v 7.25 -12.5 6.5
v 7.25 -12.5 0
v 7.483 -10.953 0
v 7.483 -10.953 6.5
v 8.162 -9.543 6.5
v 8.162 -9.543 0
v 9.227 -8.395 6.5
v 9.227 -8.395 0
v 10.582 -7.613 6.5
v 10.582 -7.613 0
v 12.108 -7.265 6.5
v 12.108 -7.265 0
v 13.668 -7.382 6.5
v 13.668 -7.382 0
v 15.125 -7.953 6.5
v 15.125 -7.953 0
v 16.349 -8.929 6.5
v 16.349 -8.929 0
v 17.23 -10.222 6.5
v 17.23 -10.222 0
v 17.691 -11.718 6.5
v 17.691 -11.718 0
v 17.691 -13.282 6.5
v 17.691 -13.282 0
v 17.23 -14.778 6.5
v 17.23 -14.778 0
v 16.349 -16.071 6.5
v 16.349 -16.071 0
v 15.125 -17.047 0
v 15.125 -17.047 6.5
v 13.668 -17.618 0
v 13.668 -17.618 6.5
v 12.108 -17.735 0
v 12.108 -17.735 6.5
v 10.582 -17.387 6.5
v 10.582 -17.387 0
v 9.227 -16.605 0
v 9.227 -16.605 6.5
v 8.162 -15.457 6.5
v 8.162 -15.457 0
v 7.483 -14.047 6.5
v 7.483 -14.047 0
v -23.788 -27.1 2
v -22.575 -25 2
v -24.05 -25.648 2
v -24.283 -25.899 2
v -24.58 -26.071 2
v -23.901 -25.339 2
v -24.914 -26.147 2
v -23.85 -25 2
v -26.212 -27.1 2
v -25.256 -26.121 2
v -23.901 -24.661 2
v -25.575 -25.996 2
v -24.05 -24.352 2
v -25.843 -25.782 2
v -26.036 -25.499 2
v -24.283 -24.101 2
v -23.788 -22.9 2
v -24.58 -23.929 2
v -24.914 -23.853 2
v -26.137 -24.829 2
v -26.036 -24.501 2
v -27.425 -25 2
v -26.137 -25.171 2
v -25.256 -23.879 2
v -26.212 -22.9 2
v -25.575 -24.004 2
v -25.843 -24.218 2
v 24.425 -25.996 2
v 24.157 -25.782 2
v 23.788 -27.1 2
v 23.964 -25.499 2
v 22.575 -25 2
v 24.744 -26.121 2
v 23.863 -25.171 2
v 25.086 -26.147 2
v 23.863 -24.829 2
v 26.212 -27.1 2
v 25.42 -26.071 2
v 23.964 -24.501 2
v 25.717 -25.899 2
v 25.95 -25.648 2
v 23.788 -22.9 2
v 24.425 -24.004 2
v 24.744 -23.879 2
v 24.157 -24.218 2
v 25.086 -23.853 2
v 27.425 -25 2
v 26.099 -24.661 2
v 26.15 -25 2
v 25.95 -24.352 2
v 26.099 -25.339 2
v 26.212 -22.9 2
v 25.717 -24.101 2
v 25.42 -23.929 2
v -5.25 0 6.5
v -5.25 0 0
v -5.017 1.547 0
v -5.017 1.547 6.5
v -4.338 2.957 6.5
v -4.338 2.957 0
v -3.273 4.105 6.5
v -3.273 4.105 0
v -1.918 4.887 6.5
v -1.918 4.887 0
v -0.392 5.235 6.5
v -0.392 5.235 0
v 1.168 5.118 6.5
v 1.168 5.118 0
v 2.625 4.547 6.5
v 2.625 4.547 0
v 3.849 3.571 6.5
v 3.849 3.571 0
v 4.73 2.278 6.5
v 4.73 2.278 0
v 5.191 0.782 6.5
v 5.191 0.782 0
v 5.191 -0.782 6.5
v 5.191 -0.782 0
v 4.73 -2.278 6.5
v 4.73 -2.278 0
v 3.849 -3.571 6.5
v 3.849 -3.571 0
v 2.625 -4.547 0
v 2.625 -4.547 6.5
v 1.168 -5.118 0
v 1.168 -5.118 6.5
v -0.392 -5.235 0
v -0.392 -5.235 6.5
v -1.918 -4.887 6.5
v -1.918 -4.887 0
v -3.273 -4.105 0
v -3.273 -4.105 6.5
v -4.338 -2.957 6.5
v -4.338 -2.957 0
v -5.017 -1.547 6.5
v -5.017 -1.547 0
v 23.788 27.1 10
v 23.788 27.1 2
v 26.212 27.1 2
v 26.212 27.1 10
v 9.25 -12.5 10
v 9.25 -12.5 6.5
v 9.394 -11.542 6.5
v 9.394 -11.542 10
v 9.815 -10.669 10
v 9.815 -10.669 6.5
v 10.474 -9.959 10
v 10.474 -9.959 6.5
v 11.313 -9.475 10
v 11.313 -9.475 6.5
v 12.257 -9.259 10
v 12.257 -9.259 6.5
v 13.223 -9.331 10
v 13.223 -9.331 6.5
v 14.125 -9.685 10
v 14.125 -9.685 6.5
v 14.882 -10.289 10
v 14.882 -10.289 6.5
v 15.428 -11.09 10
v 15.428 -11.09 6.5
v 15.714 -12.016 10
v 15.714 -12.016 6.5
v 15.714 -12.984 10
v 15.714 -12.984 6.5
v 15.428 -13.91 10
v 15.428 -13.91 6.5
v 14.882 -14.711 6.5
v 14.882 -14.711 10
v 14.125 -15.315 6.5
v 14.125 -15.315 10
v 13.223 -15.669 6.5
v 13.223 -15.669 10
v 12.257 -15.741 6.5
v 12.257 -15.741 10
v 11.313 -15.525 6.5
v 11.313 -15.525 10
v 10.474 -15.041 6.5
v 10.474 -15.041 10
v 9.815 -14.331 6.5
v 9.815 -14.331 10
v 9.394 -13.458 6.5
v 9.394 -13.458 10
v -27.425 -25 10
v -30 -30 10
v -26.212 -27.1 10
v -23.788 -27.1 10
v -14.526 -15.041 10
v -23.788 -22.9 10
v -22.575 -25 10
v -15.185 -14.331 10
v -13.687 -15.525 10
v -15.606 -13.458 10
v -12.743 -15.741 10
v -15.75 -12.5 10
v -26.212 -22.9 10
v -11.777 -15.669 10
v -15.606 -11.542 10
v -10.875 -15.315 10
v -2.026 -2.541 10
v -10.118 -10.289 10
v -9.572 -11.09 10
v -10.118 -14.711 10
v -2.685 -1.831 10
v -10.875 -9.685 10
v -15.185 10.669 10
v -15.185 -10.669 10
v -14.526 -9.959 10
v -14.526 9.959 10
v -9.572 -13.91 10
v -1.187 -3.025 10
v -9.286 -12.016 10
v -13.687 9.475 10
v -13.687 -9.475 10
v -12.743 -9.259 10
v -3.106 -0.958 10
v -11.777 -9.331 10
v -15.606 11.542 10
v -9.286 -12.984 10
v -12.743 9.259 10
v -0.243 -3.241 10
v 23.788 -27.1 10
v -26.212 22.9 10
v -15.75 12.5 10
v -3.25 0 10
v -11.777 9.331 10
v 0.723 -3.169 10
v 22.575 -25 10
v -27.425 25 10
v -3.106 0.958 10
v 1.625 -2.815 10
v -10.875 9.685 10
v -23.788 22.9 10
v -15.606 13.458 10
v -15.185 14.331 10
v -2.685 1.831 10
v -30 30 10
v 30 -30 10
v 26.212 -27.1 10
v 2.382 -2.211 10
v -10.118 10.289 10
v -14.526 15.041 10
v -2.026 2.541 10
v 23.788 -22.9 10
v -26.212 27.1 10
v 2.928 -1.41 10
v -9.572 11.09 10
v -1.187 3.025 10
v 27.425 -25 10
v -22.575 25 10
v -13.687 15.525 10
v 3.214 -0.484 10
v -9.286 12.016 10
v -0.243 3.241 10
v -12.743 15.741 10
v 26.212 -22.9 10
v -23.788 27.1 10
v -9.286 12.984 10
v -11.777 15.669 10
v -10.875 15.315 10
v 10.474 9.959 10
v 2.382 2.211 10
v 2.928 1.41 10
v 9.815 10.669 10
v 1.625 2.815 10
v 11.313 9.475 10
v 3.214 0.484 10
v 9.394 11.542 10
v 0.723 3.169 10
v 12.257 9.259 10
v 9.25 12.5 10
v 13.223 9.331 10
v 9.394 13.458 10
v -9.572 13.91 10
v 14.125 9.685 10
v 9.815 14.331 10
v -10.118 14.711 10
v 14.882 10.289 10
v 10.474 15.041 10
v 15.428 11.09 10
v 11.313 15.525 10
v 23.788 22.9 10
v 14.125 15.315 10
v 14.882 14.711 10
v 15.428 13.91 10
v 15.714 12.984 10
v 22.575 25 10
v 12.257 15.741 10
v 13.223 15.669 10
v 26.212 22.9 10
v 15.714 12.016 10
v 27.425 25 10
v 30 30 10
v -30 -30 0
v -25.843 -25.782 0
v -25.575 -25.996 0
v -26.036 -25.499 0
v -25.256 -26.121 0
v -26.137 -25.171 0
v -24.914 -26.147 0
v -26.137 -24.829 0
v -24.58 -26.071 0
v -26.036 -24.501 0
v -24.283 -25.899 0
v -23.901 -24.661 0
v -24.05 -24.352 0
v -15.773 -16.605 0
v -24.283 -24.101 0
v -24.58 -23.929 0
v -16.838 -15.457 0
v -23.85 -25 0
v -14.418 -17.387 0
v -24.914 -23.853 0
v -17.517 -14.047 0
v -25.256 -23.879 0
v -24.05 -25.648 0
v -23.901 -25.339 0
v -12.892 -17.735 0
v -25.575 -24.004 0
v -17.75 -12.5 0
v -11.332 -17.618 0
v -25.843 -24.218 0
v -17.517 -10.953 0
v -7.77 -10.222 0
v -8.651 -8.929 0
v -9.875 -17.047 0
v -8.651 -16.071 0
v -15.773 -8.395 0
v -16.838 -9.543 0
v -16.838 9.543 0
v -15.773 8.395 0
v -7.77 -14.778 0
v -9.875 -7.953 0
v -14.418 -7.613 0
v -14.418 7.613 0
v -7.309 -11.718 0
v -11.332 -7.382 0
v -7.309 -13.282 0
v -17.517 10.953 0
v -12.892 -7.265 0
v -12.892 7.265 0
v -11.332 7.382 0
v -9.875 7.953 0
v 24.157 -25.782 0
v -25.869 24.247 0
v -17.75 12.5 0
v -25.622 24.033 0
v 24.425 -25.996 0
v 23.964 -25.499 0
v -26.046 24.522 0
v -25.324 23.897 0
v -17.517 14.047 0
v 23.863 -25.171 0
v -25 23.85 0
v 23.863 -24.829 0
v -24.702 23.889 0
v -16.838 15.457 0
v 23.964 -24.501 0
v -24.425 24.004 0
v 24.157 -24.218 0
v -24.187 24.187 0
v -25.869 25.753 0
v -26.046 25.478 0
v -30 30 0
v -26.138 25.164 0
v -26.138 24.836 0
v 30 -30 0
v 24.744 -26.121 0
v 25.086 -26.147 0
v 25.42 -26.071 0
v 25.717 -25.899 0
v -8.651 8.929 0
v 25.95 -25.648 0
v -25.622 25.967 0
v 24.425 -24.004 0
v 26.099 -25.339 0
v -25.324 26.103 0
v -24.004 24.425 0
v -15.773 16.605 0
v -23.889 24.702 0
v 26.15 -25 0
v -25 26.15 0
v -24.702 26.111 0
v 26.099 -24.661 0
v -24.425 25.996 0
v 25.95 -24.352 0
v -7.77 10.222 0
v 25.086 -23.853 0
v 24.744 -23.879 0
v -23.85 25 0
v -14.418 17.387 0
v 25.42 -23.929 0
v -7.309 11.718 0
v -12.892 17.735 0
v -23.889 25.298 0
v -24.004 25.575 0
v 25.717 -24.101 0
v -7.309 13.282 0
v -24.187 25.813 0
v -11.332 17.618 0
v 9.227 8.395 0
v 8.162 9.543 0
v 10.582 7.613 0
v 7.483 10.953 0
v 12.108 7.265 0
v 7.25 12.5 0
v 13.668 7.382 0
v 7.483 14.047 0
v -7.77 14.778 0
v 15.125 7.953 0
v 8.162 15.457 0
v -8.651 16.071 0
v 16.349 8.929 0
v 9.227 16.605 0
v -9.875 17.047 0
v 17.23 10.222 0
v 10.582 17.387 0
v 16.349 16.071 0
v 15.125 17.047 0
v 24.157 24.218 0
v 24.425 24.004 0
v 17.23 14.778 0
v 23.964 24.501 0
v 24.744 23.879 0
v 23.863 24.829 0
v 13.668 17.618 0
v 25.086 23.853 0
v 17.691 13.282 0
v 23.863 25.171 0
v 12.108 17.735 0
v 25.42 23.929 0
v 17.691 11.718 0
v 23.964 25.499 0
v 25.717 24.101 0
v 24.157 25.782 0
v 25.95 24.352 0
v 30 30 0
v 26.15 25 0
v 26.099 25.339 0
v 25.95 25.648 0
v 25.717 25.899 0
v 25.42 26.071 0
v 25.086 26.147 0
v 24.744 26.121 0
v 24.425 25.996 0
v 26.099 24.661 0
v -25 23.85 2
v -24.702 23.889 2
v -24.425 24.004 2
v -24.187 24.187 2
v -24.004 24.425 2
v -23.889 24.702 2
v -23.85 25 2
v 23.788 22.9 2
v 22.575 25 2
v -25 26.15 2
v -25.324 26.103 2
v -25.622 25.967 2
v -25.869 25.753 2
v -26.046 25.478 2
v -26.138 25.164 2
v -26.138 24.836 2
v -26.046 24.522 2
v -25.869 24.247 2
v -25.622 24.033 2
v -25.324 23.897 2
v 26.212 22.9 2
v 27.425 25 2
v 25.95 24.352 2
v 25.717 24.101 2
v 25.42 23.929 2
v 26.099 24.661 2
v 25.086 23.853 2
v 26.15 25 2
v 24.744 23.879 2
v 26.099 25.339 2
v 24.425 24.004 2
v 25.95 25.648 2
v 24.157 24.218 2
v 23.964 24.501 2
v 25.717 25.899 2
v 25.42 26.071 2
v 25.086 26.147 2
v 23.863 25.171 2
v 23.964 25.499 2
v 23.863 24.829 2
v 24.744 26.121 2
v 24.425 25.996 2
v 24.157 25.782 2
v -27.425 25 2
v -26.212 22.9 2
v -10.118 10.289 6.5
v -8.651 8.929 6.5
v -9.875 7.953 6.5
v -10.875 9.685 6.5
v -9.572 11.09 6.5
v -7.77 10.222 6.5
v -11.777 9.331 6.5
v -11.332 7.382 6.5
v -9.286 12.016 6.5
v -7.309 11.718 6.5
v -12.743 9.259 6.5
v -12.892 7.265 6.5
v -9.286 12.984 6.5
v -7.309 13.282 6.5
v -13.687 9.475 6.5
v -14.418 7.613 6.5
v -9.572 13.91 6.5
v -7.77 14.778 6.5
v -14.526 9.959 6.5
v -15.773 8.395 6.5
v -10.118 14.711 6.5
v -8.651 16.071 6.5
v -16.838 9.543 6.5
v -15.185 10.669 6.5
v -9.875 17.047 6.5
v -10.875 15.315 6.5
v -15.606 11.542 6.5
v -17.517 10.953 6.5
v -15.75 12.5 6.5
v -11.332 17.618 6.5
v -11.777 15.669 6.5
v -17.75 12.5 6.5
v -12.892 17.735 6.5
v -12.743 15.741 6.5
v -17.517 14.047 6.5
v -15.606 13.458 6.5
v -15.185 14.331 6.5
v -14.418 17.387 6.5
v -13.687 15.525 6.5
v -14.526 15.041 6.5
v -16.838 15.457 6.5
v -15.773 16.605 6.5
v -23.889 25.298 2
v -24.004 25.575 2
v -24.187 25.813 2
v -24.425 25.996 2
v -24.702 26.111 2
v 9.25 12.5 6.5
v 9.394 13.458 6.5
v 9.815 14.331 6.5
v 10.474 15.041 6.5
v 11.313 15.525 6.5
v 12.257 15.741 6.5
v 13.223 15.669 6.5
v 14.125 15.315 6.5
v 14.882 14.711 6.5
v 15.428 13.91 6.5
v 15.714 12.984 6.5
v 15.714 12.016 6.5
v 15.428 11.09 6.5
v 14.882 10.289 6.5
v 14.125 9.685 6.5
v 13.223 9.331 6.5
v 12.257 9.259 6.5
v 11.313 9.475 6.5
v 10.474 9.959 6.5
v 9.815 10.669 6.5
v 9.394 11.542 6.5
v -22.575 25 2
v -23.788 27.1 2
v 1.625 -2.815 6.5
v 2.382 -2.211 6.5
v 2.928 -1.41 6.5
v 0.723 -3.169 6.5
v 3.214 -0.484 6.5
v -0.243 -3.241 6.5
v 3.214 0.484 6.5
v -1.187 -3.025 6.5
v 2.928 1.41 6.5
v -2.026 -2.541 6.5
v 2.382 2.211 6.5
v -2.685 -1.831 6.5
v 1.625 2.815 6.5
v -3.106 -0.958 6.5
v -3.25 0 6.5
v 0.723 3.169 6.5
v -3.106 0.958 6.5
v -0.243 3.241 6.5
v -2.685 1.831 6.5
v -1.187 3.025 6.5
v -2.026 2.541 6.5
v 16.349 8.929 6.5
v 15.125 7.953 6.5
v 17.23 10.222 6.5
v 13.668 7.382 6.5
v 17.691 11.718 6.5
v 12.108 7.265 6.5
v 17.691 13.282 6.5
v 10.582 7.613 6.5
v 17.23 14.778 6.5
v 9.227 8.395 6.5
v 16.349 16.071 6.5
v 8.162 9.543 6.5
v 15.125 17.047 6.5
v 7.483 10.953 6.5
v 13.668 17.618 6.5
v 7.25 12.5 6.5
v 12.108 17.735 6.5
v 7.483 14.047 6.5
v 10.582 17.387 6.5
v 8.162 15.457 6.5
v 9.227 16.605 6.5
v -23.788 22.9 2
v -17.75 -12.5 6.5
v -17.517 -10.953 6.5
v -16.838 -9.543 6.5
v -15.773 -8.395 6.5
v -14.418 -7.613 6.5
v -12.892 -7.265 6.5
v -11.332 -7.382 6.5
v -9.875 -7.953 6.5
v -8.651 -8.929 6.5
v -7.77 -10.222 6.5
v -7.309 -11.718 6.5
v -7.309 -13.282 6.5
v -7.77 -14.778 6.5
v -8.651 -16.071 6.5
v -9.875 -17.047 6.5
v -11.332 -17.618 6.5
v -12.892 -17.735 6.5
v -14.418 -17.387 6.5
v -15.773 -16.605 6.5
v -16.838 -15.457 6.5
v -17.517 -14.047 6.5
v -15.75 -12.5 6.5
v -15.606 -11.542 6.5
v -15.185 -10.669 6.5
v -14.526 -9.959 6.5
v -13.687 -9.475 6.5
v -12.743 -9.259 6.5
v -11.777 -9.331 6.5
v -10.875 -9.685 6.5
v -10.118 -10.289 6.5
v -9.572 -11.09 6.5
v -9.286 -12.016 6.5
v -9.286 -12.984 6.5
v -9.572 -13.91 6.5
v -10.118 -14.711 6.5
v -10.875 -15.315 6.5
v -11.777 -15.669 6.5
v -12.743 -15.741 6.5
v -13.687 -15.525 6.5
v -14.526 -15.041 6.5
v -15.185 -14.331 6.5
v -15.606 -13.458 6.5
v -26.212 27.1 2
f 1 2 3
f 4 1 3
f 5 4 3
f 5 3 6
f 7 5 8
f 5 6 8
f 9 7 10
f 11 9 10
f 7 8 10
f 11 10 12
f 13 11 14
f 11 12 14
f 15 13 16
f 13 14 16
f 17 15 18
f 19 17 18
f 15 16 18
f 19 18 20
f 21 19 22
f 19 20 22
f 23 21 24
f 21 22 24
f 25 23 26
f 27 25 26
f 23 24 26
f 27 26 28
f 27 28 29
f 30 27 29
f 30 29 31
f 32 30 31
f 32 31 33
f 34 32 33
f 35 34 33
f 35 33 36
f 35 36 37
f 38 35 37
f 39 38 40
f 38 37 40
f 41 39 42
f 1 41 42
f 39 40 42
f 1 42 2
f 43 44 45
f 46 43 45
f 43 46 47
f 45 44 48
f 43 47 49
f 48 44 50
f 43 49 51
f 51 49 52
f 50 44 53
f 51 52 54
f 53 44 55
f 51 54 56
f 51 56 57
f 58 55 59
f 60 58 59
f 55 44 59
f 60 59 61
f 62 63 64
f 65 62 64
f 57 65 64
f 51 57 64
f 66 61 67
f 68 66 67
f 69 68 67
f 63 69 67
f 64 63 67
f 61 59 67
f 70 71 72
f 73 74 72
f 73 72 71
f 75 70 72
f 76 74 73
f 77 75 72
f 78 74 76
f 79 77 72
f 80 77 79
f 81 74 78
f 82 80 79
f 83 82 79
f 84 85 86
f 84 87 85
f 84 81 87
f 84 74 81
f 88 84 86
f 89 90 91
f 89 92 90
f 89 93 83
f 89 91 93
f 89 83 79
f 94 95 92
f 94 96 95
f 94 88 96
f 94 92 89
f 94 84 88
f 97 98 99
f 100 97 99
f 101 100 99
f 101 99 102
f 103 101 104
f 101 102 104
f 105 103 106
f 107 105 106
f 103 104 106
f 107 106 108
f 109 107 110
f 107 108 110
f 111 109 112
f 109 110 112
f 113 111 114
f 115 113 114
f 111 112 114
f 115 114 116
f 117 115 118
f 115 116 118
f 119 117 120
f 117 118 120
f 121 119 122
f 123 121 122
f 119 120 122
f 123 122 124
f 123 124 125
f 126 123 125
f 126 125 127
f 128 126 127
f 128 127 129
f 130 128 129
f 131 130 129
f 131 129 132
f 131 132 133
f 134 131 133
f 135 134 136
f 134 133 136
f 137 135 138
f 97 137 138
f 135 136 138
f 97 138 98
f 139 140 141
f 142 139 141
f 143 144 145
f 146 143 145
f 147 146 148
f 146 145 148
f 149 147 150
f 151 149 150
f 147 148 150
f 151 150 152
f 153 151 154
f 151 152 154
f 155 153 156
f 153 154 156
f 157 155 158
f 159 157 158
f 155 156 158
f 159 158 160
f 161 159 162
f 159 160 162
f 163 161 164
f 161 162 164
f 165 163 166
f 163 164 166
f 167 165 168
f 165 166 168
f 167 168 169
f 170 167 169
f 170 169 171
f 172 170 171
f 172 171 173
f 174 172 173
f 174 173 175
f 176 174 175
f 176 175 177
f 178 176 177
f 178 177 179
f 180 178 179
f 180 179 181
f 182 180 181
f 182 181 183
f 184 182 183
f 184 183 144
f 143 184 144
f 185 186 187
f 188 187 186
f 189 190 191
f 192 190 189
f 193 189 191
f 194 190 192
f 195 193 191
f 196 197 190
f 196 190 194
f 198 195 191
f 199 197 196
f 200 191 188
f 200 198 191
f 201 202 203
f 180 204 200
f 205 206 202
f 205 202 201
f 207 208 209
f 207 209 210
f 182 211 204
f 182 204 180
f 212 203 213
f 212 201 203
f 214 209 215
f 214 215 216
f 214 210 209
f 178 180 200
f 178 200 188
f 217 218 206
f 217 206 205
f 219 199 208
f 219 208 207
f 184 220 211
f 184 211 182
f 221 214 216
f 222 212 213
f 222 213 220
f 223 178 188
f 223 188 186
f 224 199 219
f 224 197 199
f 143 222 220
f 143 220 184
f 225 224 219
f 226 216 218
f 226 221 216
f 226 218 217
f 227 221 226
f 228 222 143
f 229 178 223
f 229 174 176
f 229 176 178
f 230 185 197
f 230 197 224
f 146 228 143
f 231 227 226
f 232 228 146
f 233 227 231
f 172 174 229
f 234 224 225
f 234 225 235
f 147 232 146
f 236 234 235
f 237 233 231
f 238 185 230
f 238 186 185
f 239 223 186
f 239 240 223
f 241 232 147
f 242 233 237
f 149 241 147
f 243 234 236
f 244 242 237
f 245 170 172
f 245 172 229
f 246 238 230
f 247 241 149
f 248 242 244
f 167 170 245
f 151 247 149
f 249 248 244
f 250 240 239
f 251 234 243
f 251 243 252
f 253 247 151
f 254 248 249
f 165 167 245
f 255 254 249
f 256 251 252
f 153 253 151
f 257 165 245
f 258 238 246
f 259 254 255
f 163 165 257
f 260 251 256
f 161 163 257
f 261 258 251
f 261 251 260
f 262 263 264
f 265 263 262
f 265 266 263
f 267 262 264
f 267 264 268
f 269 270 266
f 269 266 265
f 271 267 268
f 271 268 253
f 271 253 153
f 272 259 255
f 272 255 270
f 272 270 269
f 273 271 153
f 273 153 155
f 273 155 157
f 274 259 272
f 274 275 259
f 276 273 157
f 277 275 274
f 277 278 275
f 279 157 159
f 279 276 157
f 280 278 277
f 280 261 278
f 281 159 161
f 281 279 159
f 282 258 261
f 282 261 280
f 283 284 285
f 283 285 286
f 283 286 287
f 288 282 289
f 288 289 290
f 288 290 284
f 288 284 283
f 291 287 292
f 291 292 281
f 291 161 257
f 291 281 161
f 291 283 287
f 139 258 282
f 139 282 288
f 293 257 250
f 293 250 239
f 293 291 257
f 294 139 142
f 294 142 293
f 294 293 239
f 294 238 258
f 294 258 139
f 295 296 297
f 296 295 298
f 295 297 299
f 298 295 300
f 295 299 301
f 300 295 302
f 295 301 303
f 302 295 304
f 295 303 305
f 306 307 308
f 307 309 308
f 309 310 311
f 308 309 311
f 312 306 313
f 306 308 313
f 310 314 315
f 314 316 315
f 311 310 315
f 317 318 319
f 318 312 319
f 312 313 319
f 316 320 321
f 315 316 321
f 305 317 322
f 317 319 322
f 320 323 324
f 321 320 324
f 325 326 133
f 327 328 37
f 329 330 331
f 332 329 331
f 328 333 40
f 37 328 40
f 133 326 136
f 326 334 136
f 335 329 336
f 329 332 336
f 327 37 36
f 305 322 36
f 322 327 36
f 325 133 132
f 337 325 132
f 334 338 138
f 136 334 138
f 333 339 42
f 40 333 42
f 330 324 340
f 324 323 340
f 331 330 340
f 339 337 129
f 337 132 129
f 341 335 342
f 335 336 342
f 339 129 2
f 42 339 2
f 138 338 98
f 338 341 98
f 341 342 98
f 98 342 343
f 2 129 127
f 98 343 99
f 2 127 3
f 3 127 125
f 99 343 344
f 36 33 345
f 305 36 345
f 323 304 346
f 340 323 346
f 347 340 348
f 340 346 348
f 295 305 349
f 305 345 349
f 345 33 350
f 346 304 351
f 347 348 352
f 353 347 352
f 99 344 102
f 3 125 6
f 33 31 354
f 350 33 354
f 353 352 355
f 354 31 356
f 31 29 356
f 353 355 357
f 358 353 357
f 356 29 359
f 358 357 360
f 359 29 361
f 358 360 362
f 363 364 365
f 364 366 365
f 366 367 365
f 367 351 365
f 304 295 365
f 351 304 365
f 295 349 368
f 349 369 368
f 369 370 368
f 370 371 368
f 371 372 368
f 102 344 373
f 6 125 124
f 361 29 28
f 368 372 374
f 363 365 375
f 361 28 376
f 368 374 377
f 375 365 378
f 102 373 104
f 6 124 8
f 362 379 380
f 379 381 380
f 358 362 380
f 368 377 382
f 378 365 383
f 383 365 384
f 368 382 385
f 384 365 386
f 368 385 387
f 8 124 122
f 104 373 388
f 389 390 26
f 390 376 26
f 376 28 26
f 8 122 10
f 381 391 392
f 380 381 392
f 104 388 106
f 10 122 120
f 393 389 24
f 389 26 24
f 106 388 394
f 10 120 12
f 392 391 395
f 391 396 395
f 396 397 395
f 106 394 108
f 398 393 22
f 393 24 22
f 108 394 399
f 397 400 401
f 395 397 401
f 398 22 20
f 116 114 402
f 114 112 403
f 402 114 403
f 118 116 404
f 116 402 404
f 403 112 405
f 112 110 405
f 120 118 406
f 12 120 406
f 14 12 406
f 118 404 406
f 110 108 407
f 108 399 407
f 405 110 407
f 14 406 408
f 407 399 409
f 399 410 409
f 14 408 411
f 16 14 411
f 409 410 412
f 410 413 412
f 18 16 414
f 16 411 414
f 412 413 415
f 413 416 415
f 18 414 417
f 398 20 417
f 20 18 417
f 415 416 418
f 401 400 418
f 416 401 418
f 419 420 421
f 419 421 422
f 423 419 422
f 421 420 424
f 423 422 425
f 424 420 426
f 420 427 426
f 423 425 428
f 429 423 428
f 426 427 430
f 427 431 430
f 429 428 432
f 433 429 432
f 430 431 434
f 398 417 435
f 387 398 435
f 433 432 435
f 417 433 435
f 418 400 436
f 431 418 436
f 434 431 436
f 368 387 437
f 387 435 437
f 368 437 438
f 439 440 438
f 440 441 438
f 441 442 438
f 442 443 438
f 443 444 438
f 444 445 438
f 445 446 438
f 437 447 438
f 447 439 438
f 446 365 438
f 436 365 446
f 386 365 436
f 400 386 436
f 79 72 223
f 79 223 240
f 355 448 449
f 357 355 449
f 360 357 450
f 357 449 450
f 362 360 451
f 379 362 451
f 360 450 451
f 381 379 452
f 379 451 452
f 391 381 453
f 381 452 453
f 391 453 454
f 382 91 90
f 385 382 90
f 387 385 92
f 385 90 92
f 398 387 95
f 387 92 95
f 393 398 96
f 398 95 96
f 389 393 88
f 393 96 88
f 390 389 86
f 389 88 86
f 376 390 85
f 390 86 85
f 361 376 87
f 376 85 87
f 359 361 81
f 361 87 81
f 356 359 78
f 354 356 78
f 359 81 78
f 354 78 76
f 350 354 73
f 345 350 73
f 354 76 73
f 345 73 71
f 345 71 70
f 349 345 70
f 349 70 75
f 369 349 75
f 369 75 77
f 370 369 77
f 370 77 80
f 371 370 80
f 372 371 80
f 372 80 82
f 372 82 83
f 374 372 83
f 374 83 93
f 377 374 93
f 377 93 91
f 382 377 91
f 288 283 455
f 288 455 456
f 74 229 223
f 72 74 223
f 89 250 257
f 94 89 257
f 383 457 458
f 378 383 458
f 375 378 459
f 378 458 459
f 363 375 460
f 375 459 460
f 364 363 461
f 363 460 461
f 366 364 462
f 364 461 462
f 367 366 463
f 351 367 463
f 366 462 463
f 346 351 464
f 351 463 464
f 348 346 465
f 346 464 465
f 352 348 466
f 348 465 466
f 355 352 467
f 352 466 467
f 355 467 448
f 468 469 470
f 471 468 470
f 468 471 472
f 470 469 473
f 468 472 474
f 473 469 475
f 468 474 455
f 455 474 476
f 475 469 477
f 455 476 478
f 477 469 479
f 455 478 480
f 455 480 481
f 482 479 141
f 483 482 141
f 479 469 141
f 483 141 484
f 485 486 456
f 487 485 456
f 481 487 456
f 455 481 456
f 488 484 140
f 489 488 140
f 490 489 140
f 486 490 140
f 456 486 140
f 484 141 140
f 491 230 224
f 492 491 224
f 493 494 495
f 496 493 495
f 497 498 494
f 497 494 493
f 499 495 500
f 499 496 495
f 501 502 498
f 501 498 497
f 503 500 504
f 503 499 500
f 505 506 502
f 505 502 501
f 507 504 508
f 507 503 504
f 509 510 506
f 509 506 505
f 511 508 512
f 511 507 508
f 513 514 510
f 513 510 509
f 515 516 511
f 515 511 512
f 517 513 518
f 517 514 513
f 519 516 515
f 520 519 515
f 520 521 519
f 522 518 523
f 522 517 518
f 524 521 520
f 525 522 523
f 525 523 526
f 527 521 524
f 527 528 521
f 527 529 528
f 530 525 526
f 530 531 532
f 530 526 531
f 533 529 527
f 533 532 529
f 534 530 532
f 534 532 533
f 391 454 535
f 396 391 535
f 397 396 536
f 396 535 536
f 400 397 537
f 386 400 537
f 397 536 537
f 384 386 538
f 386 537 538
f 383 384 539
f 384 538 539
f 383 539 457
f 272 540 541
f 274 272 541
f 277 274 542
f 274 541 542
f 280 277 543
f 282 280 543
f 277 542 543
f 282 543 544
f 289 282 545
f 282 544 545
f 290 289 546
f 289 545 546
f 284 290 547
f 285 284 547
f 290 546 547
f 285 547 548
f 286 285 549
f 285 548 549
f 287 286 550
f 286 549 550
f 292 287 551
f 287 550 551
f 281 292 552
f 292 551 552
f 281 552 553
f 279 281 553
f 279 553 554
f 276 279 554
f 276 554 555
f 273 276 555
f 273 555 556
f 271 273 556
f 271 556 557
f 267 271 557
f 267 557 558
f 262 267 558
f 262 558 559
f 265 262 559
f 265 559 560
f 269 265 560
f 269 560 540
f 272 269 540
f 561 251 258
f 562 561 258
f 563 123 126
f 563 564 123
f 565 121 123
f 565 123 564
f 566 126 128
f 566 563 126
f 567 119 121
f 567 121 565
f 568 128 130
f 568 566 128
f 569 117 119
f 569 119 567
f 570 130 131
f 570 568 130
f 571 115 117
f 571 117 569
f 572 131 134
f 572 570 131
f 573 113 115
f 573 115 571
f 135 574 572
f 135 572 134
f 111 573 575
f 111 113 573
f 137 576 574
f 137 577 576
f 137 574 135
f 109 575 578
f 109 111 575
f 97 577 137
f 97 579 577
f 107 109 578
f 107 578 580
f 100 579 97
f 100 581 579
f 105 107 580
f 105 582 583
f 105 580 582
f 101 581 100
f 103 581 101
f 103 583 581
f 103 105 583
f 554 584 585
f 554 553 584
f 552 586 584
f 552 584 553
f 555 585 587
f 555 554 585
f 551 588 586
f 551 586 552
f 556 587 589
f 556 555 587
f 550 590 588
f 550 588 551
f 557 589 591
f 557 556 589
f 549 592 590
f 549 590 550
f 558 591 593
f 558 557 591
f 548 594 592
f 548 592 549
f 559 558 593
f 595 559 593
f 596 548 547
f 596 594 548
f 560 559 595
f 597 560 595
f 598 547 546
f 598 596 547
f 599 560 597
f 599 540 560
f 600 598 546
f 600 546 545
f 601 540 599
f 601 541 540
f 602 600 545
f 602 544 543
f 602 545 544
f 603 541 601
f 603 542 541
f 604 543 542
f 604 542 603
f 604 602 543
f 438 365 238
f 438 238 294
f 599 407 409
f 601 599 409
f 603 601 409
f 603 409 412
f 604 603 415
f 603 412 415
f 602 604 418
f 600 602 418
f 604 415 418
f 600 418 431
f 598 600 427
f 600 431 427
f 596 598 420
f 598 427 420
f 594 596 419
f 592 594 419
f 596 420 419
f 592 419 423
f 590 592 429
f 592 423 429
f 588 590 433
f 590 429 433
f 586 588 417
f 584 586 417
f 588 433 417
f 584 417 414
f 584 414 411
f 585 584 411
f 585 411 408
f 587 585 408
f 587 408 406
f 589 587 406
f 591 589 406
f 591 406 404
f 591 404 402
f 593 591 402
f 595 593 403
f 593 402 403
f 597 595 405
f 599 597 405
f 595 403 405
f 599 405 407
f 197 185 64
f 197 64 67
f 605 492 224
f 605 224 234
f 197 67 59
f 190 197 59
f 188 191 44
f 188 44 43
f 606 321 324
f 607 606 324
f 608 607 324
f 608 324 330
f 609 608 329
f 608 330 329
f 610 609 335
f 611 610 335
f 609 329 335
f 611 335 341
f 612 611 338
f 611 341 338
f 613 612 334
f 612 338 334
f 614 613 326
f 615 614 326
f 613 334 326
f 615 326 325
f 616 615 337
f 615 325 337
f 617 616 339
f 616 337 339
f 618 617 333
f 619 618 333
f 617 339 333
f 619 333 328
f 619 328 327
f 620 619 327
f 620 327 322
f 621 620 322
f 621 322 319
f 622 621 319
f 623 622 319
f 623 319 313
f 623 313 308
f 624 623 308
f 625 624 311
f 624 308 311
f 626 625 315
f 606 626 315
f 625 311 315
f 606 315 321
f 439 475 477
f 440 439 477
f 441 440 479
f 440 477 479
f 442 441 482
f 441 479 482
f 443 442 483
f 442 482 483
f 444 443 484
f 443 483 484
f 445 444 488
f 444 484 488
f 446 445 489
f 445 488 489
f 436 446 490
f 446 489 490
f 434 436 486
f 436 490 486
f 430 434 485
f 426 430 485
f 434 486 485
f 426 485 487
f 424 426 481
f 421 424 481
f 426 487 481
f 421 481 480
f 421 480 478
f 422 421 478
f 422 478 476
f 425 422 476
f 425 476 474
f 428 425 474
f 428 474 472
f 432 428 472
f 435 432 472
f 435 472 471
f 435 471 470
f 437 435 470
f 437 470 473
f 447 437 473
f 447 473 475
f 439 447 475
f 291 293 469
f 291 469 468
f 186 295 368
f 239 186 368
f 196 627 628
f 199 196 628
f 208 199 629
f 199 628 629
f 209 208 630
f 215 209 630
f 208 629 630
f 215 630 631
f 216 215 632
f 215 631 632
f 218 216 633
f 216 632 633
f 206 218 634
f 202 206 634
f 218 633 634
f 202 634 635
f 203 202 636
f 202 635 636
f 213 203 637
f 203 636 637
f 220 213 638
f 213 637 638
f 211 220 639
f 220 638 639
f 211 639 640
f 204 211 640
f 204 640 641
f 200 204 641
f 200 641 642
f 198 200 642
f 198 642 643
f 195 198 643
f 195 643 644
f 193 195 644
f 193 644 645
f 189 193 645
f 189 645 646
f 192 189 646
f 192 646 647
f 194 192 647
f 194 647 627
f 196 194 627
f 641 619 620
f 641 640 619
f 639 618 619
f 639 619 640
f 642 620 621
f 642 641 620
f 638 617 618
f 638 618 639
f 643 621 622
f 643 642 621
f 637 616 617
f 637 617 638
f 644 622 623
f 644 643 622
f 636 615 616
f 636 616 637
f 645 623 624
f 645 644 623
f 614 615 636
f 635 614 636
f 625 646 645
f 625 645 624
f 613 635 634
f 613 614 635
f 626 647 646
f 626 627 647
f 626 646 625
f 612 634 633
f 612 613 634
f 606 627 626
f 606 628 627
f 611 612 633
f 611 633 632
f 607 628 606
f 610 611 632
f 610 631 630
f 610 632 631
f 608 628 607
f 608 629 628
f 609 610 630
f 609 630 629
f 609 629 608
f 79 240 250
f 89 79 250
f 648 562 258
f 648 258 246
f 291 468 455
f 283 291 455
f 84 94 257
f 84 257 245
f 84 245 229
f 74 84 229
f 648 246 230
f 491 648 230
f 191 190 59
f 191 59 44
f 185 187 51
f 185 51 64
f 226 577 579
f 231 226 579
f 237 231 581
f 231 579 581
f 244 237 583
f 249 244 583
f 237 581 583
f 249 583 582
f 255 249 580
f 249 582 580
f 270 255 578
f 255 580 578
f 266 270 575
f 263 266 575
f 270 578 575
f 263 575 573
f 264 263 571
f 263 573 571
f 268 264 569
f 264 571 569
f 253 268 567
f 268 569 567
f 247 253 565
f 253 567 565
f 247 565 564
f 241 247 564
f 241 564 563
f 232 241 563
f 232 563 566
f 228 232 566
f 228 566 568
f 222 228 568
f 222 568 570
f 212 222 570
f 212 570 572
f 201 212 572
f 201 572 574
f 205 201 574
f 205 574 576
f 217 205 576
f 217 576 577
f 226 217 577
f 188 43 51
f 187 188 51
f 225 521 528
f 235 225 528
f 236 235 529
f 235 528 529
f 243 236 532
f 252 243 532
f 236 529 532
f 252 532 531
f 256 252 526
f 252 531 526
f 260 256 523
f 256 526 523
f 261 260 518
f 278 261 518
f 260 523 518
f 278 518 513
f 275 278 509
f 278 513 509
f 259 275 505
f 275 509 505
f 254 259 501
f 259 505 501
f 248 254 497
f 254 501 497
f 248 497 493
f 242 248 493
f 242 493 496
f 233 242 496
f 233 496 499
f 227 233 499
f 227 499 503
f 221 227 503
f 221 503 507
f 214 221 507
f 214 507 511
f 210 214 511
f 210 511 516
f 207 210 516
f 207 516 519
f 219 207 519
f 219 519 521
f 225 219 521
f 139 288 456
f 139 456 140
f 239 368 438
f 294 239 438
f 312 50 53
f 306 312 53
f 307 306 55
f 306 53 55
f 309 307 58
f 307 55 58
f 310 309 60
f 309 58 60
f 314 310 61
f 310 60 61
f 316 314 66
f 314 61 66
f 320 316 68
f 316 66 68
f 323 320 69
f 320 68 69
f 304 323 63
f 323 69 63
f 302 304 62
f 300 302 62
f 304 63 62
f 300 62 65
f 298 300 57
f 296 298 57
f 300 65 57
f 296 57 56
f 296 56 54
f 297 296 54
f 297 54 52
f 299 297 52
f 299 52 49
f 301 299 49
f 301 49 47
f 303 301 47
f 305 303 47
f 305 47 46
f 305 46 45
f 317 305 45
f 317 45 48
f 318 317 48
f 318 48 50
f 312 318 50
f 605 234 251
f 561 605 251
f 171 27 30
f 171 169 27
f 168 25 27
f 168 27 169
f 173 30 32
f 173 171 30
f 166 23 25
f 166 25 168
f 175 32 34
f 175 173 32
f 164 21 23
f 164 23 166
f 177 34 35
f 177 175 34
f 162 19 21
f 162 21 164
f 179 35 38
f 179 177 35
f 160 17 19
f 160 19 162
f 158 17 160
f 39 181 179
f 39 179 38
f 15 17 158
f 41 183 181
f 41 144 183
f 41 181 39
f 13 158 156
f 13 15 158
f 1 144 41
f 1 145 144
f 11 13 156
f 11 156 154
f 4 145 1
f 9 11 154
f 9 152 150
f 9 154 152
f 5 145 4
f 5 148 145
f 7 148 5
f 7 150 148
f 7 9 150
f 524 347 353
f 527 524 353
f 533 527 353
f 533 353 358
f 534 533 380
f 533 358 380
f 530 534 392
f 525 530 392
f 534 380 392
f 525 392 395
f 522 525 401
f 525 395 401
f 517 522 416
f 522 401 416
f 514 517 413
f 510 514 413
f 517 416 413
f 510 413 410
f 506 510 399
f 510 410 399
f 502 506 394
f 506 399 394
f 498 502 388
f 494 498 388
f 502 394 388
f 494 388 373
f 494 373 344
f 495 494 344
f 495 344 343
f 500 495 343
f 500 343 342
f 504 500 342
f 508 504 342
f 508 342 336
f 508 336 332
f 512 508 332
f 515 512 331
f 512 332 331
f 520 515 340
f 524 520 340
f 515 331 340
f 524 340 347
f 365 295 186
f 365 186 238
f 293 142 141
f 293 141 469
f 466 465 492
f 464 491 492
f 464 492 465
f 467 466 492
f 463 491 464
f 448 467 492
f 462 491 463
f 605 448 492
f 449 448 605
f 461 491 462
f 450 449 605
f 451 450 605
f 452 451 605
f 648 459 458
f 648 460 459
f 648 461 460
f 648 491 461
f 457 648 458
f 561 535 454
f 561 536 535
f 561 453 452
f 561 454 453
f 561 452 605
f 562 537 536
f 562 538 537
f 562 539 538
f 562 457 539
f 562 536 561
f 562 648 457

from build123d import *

# Parameters (mm, degrees)
SKETCH1_W           = 60
SKETCH1_H           = 60
BOSS_EXTRUDE1_DEPTH = 10
SKETCH2_R           = 1.15
CUT_EXTRUDE1_DEPTH  = 44.588989435
SKETCH3_R           = 1.15
CUT_EXTRUDE2_DEPTH  = 8
SKETCH5_R           = 5.25
CUT_EXTRUDE4_DEPTH  = 6.5
SKETCH6_R           = 3.25
CUT_EXTRUDE5_DEPTH  = 43.921439864


with BuildPart() as part:
    # Sketch1 → Boss-Extrude1 (new body)
    with BuildSketch(Plane.XY):
        Rectangle(SKETCH1_W, SKETCH1_H)
    extrude(amount=BOSS_EXTRUDE1_DEPTH)

    # Sketch2 → Cut-Extrude1 (cut, through all)
    with BuildSketch(Plane.XY.offset(10)):
        with BuildLine():
            ThreePointArc((-25, 26.15), (-26.15, 25), (-25, 23.85))
            Line((-25, 23.85), (-25, 26.15))
        make_face()
        with BuildLine():
            Line((-25, 26.15), (-25, 23.85))
            ThreePointArc((-25, 23.85), (-24.186827202, 24.186827202), (-23.85, 25))
            ThreePointArc((-23.85, 25), (-24.186827202, 25.813172798), (-25, 26.15))
        make_face()
        with Locations((25, 25)):
            Circle(SKETCH2_R)
        with Locations((25, -25)):
            Circle(SKETCH2_R)
        with Locations((-25, -25)):
            Circle(SKETCH2_R)
    extrude(amount=-CUT_EXTRUDE1_DEPTH, mode=Mode.SUBTRACT)

    # Sketch3 → Cut-Extrude2 (cut)
    # profile 1 of 4: a face of its own
    with BuildSketch(Plane.XY.offset(10)):
        Polygon((-26.212435565, 22.9), (-23.787564435, 22.9), (-22.575128869, 25), (-23.787564435, 27.1), (-26.212435565, 27.1), (-27.424871131, 25), align=None)
        with Locations((-25, 25)):
            Circle(SKETCH3_R, mode=Mode.SUBTRACT)
    # profile 2 of 4: a face of its own
    with BuildSketch(Plane.XY.offset(10)):
        Polygon((22.575128869, 25), (23.787564435, 27.1), (26.212435565, 27.1), (27.424871131, 25), (26.212435565, 22.9), (23.787564435, 22.9), align=None)
        with Locations((25, 25)):
            Circle(SKETCH3_R, mode=Mode.SUBTRACT)
    # profile 3 of 4: a face of its own
    with BuildSketch(Plane.XY.offset(10)):
        Polygon((26.212435565, -22.9), (23.787564435, -22.9), (22.575128869, -25), (23.787564435, -27.1), (26.212435565, -27.1), (27.424871131, -25), align=None)
        with Locations((25, -25)):
            Circle(SKETCH3_R, mode=Mode.SUBTRACT)
    # profile 4 of 4: a face of its own
    with BuildSketch(Plane.XY.offset(10)):
        Polygon((-22.575128869, -25), (-23.787564435, -27.1), (-26.212435565, -27.1), (-27.424871131, -25), (-26.212435565, -22.9), (-23.787564435, -22.9), align=None)
        with Locations((-25, -25)):
            Circle(SKETCH3_R, mode=Mode.SUBTRACT)
    extrude(amount=-CUT_EXTRUDE2_DEPTH, mode=Mode.SUBTRACT)

    # Sketch5 → Cut-Extrude4 (cut)
    with BuildSketch(Plane(origin=(0, 0, 0), x_dir=(-1, 0, 0), z_dir=(0, 0, -1))):
        with Locations((-12.5, 12.5)):
            Circle(SKETCH5_R)
        with Locations((12.5, 12.5)):
            Circle(SKETCH5_R)
        Circle(SKETCH5_R)
        with Locations((-12.5, -12.5)):
            Circle(SKETCH5_R)
        with Locations((12.5, -12.5)):
            Circle(SKETCH5_R)
    extrude(amount=-CUT_EXTRUDE4_DEPTH, mode=Mode.SUBTRACT)

    # Sketch6 → Cut-Extrude5 (cut, through all)
    with BuildSketch(Plane(origin=(0, 0, 6.5), x_dir=(-1, 0, 0), z_dir=(0, 0, -1))):
        with Locations((-12.5, 12.5)):
            Circle(SKETCH6_R)
        with Locations((12.5, 12.5)):
            Circle(SKETCH6_R)
        Circle(SKETCH6_R)
        with Locations((-12.5, -12.5)):
            Circle(SKETCH6_R)
        with Locations((12.5, -12.5)):
            Circle(SKETCH6_R)
    extrude(amount=-CUT_EXTRUDE5_DEPTH, mode=Mode.SUBTRACT)


solid = part.part
